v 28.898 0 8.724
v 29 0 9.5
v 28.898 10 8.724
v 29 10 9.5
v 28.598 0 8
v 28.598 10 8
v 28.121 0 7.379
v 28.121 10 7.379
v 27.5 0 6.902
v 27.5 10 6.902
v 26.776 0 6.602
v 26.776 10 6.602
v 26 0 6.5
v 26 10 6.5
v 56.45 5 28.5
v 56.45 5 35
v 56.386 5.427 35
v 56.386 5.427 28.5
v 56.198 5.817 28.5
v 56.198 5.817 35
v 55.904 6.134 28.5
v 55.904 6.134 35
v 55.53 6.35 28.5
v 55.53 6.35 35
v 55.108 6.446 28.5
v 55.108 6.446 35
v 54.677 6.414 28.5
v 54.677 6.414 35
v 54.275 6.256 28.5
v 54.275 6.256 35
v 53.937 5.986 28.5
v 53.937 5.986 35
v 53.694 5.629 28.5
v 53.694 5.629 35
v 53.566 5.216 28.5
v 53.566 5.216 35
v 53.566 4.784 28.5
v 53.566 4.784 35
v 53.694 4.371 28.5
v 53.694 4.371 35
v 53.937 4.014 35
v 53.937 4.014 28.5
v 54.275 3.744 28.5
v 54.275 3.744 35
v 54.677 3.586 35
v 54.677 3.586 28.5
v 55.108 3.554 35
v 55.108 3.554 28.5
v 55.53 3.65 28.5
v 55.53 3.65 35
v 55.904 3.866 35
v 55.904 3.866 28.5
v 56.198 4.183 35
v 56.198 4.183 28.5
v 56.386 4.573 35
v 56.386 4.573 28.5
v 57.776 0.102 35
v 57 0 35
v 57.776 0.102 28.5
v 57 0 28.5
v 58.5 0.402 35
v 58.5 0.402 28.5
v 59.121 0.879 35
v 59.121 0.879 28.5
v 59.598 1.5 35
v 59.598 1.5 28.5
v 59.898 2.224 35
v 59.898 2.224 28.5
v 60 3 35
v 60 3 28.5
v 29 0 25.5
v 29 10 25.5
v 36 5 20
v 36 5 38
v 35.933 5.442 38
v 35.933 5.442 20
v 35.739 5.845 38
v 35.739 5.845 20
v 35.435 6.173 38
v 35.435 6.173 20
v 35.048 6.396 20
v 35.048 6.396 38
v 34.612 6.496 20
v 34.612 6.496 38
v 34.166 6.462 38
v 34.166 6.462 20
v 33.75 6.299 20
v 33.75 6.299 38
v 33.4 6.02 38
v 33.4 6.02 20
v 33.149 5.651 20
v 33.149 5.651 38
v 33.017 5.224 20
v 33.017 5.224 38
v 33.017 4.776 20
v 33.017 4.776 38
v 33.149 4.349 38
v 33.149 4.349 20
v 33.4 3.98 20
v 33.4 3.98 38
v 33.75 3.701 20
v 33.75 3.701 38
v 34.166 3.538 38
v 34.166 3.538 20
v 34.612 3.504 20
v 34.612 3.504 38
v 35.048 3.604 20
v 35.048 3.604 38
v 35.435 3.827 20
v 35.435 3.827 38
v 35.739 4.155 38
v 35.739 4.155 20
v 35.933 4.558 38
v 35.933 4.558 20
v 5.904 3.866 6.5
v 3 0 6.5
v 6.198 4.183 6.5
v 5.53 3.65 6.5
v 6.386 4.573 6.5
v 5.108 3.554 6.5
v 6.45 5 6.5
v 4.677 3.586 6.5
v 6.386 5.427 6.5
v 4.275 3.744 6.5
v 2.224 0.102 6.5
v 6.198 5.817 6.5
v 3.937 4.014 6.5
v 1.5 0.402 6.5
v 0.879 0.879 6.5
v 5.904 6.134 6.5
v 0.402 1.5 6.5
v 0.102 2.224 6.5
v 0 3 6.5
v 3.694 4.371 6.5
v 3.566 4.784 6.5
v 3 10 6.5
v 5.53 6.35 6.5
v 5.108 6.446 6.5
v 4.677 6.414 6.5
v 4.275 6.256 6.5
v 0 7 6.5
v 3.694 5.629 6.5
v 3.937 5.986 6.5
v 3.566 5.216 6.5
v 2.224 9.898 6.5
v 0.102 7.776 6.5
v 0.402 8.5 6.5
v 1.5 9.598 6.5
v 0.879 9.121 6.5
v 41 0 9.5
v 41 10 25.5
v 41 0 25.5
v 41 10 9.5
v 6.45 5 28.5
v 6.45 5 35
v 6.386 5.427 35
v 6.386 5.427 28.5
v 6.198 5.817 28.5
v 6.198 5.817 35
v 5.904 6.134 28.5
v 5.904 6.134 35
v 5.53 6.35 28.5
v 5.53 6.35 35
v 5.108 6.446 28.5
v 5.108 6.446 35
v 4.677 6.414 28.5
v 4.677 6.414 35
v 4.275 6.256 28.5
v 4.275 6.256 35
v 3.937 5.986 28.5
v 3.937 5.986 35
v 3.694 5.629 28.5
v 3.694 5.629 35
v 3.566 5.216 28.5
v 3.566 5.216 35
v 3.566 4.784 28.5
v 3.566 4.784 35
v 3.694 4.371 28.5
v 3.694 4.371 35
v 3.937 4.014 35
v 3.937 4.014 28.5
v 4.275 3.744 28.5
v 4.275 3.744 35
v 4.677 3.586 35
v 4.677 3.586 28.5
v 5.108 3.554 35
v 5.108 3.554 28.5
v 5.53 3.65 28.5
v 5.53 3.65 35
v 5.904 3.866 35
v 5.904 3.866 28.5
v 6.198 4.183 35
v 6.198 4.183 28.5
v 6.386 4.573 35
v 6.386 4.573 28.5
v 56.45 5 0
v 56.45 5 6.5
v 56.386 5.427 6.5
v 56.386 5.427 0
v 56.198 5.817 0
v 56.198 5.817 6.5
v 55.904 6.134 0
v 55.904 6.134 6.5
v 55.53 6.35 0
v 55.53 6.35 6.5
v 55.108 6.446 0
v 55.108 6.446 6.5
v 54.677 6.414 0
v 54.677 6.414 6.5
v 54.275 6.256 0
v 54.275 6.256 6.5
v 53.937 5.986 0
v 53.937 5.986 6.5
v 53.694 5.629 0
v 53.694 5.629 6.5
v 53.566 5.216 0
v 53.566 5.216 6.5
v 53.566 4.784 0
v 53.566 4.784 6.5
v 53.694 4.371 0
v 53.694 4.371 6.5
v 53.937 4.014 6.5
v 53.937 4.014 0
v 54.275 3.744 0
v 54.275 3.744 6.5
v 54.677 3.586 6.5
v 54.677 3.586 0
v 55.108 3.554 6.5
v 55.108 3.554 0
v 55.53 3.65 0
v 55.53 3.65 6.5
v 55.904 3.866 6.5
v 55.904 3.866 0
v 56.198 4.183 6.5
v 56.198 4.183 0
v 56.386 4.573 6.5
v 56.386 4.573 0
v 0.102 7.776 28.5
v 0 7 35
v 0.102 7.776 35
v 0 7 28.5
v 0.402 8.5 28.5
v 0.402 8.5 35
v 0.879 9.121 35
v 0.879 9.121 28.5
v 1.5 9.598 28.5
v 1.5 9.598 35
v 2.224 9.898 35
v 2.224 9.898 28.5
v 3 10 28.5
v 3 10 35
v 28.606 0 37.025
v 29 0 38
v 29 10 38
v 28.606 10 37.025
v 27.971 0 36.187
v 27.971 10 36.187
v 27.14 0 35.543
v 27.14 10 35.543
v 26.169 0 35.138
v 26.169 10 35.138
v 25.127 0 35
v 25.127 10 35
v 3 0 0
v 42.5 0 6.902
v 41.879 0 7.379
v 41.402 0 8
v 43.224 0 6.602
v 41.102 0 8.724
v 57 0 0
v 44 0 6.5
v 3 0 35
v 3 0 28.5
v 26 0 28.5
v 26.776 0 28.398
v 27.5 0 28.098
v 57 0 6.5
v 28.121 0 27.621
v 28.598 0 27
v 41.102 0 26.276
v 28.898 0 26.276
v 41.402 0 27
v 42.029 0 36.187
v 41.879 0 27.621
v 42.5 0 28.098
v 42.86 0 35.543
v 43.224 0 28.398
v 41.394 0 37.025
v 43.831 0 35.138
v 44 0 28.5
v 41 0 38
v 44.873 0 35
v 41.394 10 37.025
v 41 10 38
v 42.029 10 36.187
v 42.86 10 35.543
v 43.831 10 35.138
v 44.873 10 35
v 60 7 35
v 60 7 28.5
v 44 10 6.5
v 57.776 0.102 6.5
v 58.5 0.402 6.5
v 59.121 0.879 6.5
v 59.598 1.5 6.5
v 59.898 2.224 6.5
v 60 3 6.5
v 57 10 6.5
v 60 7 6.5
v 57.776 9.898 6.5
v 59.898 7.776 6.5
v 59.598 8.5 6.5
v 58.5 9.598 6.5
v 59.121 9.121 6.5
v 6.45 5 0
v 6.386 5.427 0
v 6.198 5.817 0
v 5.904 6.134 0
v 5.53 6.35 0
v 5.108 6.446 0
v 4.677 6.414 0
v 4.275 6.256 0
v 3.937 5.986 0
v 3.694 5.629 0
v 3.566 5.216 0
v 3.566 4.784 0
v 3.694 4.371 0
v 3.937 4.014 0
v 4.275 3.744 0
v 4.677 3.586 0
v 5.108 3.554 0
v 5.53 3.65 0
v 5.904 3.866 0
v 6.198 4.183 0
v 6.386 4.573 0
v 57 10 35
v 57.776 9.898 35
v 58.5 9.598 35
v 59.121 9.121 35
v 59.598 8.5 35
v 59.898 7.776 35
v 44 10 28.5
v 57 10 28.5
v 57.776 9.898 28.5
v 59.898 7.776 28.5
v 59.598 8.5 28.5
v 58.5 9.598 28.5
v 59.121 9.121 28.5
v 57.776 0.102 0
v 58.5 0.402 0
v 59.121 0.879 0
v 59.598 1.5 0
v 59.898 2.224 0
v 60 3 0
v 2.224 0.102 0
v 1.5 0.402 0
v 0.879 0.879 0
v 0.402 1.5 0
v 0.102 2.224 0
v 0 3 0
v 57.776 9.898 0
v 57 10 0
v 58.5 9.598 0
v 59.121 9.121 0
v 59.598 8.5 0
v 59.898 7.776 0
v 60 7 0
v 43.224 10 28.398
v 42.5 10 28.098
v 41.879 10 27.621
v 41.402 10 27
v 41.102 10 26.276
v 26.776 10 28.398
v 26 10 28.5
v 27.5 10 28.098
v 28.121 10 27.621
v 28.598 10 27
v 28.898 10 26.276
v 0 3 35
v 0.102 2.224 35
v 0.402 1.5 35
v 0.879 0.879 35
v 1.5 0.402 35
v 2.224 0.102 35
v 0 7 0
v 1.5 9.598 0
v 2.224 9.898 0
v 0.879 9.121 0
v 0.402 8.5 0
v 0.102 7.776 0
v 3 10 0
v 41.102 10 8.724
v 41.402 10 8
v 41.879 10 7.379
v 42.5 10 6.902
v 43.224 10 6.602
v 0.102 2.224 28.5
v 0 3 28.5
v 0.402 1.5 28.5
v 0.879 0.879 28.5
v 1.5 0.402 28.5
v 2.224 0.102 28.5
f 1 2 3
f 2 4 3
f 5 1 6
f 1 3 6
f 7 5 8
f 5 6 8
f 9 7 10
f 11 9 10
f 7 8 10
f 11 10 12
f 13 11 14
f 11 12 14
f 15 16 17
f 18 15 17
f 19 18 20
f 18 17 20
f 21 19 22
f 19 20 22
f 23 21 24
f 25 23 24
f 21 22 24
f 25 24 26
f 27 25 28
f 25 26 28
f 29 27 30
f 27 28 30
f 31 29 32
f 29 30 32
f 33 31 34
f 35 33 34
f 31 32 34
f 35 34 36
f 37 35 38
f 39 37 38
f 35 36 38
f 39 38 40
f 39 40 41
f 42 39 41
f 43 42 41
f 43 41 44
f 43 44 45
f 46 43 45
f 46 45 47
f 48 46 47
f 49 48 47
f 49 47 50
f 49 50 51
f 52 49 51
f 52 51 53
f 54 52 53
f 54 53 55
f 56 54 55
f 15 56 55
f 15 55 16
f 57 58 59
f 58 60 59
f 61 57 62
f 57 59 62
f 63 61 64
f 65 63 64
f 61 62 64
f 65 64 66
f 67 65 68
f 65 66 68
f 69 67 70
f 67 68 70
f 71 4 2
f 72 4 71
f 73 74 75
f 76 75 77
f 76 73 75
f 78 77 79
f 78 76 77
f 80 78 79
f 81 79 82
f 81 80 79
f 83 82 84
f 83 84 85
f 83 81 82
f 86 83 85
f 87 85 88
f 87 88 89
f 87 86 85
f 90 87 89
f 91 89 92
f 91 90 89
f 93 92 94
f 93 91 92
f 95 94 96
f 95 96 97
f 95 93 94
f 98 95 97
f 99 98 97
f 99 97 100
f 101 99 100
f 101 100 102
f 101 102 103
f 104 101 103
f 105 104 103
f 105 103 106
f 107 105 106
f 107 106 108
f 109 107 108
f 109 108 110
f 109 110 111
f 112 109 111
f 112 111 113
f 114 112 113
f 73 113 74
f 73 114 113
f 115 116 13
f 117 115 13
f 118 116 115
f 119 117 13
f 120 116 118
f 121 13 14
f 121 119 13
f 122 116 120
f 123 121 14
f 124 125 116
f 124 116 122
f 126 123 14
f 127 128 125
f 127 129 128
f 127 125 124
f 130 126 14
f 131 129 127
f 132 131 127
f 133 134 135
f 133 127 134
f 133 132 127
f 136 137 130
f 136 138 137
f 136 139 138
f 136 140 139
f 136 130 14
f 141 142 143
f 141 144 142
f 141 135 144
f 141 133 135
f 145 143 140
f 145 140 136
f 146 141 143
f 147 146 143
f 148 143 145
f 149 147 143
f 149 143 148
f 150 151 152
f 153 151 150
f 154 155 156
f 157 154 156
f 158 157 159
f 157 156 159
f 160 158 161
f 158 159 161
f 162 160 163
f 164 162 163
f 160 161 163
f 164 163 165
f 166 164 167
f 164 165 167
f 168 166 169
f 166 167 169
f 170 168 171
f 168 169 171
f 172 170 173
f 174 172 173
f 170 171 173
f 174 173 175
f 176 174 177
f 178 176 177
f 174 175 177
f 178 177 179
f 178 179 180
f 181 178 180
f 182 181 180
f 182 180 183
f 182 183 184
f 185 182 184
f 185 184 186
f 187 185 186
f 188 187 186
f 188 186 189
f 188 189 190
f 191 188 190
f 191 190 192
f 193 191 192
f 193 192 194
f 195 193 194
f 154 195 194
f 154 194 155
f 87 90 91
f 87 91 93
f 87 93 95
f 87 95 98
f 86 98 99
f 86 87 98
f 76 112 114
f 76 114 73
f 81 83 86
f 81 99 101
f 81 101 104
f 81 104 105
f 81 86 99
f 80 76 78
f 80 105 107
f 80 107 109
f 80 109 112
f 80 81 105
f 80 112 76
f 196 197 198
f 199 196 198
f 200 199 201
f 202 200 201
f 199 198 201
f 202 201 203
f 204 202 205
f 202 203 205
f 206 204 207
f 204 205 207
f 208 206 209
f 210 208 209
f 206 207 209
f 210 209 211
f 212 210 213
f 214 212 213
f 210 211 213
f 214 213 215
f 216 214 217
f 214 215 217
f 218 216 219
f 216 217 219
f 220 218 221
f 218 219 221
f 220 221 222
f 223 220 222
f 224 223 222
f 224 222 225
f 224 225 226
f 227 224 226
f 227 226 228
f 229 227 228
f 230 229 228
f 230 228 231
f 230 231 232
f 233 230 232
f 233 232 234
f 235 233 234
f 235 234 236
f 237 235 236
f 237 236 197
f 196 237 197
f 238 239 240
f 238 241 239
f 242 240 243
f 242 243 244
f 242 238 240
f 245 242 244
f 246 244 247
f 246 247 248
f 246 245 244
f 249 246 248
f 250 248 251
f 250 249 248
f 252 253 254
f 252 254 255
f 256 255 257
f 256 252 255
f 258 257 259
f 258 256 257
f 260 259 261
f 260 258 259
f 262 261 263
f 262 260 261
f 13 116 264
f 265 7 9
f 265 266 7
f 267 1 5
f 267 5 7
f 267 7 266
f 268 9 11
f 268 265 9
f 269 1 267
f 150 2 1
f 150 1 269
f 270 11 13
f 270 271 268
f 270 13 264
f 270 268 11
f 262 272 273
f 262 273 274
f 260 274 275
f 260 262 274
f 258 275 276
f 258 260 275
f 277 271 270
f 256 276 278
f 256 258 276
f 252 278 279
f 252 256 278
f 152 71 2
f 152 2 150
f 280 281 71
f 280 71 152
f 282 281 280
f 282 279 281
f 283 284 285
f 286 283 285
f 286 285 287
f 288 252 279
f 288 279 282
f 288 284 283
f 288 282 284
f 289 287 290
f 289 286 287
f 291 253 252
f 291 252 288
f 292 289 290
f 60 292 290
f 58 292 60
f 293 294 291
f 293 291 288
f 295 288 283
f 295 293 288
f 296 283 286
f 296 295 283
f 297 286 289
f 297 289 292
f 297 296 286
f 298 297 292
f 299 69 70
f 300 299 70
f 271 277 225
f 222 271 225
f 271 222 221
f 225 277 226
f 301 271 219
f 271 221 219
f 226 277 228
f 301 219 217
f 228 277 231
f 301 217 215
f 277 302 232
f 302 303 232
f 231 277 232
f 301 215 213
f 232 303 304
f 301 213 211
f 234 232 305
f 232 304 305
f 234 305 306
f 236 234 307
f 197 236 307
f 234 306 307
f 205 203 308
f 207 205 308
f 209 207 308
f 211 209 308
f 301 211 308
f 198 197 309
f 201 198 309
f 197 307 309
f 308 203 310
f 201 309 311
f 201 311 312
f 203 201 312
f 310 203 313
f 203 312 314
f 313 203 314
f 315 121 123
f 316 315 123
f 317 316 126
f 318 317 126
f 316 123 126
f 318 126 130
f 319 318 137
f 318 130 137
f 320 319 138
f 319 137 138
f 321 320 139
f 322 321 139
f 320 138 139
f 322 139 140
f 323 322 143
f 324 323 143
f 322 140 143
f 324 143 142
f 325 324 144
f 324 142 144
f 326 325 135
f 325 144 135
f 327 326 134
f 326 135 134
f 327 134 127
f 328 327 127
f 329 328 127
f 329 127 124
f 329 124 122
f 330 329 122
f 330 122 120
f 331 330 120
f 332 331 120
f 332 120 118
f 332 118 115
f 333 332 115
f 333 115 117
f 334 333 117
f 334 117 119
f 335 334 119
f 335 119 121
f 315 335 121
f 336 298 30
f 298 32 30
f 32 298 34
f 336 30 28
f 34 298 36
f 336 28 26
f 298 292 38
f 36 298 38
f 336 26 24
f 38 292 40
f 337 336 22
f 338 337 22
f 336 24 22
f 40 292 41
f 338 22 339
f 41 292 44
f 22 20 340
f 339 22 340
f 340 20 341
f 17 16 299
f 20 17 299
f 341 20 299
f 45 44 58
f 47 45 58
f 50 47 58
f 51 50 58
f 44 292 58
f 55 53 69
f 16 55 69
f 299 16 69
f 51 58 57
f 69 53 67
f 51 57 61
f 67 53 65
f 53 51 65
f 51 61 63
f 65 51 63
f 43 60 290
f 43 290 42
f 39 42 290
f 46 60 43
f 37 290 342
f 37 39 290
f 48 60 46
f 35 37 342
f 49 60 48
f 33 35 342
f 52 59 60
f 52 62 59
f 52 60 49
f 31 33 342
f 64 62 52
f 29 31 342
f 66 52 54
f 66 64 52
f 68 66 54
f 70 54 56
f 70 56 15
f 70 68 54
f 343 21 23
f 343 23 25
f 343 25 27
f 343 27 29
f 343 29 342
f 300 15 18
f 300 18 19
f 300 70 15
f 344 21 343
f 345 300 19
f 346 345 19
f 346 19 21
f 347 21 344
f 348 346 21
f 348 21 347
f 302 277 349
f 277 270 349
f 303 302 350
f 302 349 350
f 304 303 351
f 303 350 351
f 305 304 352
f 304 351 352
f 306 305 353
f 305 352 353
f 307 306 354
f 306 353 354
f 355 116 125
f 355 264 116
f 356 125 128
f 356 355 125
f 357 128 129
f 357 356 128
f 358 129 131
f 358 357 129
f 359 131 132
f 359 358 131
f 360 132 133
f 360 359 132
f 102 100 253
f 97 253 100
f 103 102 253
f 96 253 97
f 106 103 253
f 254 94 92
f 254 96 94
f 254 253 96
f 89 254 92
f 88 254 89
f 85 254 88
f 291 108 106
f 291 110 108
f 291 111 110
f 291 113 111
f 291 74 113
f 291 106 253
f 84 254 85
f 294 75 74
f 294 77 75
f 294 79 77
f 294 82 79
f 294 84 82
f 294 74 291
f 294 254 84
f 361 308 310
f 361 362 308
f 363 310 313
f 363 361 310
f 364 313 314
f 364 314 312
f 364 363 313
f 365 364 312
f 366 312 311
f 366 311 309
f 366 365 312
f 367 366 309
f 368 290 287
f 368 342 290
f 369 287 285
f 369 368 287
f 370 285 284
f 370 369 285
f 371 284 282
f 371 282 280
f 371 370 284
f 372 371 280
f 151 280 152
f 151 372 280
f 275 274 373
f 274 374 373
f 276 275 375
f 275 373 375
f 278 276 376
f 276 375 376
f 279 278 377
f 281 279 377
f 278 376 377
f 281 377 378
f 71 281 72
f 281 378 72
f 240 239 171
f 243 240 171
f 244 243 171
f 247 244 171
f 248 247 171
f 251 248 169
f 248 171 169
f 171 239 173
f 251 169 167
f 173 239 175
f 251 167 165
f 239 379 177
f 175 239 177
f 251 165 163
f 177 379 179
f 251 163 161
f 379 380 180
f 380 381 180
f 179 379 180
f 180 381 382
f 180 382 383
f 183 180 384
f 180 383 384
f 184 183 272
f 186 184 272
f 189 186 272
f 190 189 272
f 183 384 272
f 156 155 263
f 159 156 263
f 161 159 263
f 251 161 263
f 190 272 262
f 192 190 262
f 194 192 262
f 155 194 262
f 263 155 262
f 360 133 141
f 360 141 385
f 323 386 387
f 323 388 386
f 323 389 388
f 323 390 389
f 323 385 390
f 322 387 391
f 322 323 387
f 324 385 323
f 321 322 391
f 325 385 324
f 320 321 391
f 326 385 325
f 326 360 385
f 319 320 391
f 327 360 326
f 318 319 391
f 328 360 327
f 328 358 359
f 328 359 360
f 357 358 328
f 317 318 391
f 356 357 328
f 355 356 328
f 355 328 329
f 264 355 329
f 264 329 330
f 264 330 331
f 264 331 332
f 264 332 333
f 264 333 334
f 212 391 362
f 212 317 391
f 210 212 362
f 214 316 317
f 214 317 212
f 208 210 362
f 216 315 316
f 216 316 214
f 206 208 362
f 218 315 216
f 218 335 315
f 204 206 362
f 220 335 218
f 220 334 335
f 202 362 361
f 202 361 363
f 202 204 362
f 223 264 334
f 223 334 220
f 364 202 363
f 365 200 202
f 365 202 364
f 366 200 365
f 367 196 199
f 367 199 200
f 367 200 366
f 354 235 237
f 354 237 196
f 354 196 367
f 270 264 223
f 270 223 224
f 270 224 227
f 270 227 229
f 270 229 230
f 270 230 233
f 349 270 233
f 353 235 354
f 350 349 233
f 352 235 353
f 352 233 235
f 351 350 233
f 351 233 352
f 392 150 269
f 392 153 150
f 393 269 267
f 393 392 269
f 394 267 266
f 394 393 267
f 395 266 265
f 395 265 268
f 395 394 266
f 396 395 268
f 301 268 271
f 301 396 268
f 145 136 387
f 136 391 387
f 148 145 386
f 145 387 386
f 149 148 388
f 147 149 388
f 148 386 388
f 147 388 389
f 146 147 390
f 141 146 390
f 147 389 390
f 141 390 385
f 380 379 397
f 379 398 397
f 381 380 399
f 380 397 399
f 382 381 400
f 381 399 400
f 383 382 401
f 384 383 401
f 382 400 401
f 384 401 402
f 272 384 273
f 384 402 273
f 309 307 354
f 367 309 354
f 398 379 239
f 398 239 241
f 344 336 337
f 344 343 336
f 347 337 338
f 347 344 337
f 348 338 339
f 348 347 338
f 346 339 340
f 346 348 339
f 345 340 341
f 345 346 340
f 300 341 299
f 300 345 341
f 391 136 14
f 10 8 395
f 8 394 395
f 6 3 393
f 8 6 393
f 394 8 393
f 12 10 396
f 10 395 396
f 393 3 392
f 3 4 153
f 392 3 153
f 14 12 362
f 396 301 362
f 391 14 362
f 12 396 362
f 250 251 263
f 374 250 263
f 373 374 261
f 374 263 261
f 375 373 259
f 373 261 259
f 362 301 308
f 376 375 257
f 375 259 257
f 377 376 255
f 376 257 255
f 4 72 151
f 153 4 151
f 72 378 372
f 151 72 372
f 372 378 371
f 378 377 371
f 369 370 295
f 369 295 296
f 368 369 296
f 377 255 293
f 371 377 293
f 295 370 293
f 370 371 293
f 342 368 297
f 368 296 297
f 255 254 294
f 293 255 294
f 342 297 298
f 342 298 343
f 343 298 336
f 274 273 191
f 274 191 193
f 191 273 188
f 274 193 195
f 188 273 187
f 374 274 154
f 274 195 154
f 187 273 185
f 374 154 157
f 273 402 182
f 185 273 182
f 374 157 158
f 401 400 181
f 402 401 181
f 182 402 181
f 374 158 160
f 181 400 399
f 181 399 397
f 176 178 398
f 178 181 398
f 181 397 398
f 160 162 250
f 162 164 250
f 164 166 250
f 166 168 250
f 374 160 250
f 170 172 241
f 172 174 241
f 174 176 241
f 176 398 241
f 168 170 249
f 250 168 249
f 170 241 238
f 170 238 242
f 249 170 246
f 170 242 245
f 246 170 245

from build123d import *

# Parameters (mm, degrees)
SKETCH1_W               = 60
SKETCH1_H               = 35
BOSS_EXTRUDE1_DEPTH     = 10
SKETCH2_W               = 22
SKETCH2_H               = 10
CUT_EXTRUDE1_DEPTH      = 19
SKETCH3_W               = 22
SKETCH3_H               = 10
CUT_EXTRUDE2_DEPTH      = 29
SKETCH5_R               = 1.45
CUT_EXTRUDE4_DEPTH      = 71.178344238
FILLET1_R               = 3
FILLET2_R               = 3
SKETCH7_W               = 12
SKETCH7_H               = 10
BOSS_EXTRUDE2_DEPTH     = 3
CUT_EXTRUDE5_DEPTH      = 3
CUT_EXTRUDE5_DEPTH_BACK = 15
SKETCH6_R               = 1.5
FILLET3_R               = 4


with BuildPart() as part:
    # Sketch1 → Boss-Extrude1 (new body)
    with BuildSketch(Plane(origin=(0, 0, 0), x_dir=(1, 0, 0), z_dir=(0, 1, 0))):
        with Locations((30, -17.5)):
            Rectangle(SKETCH1_W, SKETCH1_H)
    extrude(amount=BOSS_EXTRUDE1_DEPTH)

    # Sketch2 → Cut-Extrude1 (cut)
    with BuildSketch(Plane(origin=(60, 0, 0), x_dir=(0, 0, -1), z_dir=(1, 0, 0))):
        with Locations((-17.5, 5)):
            Rectangle(SKETCH2_W, SKETCH2_H)
    extrude(amount=-CUT_EXTRUDE1_DEPTH, mode=Mode.SUBTRACT)

    # Sketch3 → Cut-Extrude2 (cut)
    with BuildSketch(Plane.ZY):
        with Locations((17.5, 5)):
            Rectangle(SKETCH3_W, SKETCH3_H)
    extrude(amount=-CUT_EXTRUDE2_DEPTH, mode=Mode.SUBTRACT)

    # Sketch5 → Cut-Extrude4 (cut, through all)
    with BuildSketch(Plane.XY.offset(35)):
        with Locations((5, 5)):
            Circle(SKETCH5_R)
        with Locations((55, 5)):
            Circle(SKETCH5_R)
    extrude(amount=-CUT_EXTRUDE4_DEPTH, mode=Mode.SUBTRACT)

    # Fillet1
    fillet1_edges = [part.edges().sort_by_distance(p)[0] for p in [
        (60, 10, 31.75),
        (60, 0, 3.25),
        (60, 10, 3.25),
        (0, 0, 31.75),
        (0, 10, 31.75),
        (0, 10, 3.25),
        (60, 0, 31.75),
        (0, 0, 3.25),
    ]]
    fillet(fillet1_edges, radius=FILLET1_R)

    # Fillet2
    fillet2_edges = [part.edges().sort_by_distance(p)[0] for p in [
        (41, 5, 28.5),
        (41, 5, 6.5),
        (29, 5, 6.5),
        (29, 5, 28.5),
    ]]
    fillet(fillet2_edges, radius=FILLET2_R)

    # Sketch7 → Boss-Extrude2 (add)
    with BuildSketch(Plane.XY.offset(35)):
        with Locations((35, 5)):
            Rectangle(SKETCH7_W, SKETCH7_H)
    extrude(amount=BOSS_EXTRUDE2_DEPTH)

    # Sketch6 → Cut-Extrude5 (cut, two sides: drawn at the far end of the back side and taken through both)
    with BuildSketch(Plane.XY.offset(35).offset(-CUT_EXTRUDE5_DEPTH_BACK)):
        with Locations((34.5, 5)):
            Circle(SKETCH6_R)
    extrude(amount=CUT_EXTRUDE5_DEPTH + CUT_EXTRUDE5_DEPTH_BACK, mode=Mode.SUBTRACT)

    # Fillet3
    # the kernel refuses this fillet: 4 mm, written as the material it adds along each edge
    with BuildSketch(Plane(origin=(41, 10, 35), x_dir=(0, 0, 1), z_dir=(0, -1, 0))) as fillet3_piece_1:
        with BuildLine():
            CenterArc((4, -3.872983346), FILLET3_R, 104.477512186, 75.522487814)
            Line((0, -3.872983346), (-0.08, -3.872983346))
            Line((-0.08, -3.872983346), (-0.08, 0))
            Line((-0.08, 0), (0, 0.08))
            ThreePointArc((0, 0.08), (1.5, 0.08), (2.98, 0.077459667))
            Line((2.98, 0.077459667), (3, 0))
        make_face()
    extrude(amount=10)
    with BuildSketch(Plane(origin=(29, 0, 35), x_dir=(-1, 0, 0), z_dir=(0, 1, 0))) as fillet3_piece_2:
        with BuildLine():
            CenterArc((3.872983346, 4), FILLET3_R, 194.477512186, 75.522487814)
            Line((0, 3), (-0.077459667, 2.98))
            ThreePointArc((-0.077459667, 2.98), (-0.08, 1.5), (-0.08, 0))
            Line((-0.08, 0), (0, -0.08))
            Line((0, -0.08), (3.872983346, -0.08))
            Line((3.872983346, -0.08), (3.872983346, 0))
        make_face()
    extrude(amount=10)


solid = part.part
